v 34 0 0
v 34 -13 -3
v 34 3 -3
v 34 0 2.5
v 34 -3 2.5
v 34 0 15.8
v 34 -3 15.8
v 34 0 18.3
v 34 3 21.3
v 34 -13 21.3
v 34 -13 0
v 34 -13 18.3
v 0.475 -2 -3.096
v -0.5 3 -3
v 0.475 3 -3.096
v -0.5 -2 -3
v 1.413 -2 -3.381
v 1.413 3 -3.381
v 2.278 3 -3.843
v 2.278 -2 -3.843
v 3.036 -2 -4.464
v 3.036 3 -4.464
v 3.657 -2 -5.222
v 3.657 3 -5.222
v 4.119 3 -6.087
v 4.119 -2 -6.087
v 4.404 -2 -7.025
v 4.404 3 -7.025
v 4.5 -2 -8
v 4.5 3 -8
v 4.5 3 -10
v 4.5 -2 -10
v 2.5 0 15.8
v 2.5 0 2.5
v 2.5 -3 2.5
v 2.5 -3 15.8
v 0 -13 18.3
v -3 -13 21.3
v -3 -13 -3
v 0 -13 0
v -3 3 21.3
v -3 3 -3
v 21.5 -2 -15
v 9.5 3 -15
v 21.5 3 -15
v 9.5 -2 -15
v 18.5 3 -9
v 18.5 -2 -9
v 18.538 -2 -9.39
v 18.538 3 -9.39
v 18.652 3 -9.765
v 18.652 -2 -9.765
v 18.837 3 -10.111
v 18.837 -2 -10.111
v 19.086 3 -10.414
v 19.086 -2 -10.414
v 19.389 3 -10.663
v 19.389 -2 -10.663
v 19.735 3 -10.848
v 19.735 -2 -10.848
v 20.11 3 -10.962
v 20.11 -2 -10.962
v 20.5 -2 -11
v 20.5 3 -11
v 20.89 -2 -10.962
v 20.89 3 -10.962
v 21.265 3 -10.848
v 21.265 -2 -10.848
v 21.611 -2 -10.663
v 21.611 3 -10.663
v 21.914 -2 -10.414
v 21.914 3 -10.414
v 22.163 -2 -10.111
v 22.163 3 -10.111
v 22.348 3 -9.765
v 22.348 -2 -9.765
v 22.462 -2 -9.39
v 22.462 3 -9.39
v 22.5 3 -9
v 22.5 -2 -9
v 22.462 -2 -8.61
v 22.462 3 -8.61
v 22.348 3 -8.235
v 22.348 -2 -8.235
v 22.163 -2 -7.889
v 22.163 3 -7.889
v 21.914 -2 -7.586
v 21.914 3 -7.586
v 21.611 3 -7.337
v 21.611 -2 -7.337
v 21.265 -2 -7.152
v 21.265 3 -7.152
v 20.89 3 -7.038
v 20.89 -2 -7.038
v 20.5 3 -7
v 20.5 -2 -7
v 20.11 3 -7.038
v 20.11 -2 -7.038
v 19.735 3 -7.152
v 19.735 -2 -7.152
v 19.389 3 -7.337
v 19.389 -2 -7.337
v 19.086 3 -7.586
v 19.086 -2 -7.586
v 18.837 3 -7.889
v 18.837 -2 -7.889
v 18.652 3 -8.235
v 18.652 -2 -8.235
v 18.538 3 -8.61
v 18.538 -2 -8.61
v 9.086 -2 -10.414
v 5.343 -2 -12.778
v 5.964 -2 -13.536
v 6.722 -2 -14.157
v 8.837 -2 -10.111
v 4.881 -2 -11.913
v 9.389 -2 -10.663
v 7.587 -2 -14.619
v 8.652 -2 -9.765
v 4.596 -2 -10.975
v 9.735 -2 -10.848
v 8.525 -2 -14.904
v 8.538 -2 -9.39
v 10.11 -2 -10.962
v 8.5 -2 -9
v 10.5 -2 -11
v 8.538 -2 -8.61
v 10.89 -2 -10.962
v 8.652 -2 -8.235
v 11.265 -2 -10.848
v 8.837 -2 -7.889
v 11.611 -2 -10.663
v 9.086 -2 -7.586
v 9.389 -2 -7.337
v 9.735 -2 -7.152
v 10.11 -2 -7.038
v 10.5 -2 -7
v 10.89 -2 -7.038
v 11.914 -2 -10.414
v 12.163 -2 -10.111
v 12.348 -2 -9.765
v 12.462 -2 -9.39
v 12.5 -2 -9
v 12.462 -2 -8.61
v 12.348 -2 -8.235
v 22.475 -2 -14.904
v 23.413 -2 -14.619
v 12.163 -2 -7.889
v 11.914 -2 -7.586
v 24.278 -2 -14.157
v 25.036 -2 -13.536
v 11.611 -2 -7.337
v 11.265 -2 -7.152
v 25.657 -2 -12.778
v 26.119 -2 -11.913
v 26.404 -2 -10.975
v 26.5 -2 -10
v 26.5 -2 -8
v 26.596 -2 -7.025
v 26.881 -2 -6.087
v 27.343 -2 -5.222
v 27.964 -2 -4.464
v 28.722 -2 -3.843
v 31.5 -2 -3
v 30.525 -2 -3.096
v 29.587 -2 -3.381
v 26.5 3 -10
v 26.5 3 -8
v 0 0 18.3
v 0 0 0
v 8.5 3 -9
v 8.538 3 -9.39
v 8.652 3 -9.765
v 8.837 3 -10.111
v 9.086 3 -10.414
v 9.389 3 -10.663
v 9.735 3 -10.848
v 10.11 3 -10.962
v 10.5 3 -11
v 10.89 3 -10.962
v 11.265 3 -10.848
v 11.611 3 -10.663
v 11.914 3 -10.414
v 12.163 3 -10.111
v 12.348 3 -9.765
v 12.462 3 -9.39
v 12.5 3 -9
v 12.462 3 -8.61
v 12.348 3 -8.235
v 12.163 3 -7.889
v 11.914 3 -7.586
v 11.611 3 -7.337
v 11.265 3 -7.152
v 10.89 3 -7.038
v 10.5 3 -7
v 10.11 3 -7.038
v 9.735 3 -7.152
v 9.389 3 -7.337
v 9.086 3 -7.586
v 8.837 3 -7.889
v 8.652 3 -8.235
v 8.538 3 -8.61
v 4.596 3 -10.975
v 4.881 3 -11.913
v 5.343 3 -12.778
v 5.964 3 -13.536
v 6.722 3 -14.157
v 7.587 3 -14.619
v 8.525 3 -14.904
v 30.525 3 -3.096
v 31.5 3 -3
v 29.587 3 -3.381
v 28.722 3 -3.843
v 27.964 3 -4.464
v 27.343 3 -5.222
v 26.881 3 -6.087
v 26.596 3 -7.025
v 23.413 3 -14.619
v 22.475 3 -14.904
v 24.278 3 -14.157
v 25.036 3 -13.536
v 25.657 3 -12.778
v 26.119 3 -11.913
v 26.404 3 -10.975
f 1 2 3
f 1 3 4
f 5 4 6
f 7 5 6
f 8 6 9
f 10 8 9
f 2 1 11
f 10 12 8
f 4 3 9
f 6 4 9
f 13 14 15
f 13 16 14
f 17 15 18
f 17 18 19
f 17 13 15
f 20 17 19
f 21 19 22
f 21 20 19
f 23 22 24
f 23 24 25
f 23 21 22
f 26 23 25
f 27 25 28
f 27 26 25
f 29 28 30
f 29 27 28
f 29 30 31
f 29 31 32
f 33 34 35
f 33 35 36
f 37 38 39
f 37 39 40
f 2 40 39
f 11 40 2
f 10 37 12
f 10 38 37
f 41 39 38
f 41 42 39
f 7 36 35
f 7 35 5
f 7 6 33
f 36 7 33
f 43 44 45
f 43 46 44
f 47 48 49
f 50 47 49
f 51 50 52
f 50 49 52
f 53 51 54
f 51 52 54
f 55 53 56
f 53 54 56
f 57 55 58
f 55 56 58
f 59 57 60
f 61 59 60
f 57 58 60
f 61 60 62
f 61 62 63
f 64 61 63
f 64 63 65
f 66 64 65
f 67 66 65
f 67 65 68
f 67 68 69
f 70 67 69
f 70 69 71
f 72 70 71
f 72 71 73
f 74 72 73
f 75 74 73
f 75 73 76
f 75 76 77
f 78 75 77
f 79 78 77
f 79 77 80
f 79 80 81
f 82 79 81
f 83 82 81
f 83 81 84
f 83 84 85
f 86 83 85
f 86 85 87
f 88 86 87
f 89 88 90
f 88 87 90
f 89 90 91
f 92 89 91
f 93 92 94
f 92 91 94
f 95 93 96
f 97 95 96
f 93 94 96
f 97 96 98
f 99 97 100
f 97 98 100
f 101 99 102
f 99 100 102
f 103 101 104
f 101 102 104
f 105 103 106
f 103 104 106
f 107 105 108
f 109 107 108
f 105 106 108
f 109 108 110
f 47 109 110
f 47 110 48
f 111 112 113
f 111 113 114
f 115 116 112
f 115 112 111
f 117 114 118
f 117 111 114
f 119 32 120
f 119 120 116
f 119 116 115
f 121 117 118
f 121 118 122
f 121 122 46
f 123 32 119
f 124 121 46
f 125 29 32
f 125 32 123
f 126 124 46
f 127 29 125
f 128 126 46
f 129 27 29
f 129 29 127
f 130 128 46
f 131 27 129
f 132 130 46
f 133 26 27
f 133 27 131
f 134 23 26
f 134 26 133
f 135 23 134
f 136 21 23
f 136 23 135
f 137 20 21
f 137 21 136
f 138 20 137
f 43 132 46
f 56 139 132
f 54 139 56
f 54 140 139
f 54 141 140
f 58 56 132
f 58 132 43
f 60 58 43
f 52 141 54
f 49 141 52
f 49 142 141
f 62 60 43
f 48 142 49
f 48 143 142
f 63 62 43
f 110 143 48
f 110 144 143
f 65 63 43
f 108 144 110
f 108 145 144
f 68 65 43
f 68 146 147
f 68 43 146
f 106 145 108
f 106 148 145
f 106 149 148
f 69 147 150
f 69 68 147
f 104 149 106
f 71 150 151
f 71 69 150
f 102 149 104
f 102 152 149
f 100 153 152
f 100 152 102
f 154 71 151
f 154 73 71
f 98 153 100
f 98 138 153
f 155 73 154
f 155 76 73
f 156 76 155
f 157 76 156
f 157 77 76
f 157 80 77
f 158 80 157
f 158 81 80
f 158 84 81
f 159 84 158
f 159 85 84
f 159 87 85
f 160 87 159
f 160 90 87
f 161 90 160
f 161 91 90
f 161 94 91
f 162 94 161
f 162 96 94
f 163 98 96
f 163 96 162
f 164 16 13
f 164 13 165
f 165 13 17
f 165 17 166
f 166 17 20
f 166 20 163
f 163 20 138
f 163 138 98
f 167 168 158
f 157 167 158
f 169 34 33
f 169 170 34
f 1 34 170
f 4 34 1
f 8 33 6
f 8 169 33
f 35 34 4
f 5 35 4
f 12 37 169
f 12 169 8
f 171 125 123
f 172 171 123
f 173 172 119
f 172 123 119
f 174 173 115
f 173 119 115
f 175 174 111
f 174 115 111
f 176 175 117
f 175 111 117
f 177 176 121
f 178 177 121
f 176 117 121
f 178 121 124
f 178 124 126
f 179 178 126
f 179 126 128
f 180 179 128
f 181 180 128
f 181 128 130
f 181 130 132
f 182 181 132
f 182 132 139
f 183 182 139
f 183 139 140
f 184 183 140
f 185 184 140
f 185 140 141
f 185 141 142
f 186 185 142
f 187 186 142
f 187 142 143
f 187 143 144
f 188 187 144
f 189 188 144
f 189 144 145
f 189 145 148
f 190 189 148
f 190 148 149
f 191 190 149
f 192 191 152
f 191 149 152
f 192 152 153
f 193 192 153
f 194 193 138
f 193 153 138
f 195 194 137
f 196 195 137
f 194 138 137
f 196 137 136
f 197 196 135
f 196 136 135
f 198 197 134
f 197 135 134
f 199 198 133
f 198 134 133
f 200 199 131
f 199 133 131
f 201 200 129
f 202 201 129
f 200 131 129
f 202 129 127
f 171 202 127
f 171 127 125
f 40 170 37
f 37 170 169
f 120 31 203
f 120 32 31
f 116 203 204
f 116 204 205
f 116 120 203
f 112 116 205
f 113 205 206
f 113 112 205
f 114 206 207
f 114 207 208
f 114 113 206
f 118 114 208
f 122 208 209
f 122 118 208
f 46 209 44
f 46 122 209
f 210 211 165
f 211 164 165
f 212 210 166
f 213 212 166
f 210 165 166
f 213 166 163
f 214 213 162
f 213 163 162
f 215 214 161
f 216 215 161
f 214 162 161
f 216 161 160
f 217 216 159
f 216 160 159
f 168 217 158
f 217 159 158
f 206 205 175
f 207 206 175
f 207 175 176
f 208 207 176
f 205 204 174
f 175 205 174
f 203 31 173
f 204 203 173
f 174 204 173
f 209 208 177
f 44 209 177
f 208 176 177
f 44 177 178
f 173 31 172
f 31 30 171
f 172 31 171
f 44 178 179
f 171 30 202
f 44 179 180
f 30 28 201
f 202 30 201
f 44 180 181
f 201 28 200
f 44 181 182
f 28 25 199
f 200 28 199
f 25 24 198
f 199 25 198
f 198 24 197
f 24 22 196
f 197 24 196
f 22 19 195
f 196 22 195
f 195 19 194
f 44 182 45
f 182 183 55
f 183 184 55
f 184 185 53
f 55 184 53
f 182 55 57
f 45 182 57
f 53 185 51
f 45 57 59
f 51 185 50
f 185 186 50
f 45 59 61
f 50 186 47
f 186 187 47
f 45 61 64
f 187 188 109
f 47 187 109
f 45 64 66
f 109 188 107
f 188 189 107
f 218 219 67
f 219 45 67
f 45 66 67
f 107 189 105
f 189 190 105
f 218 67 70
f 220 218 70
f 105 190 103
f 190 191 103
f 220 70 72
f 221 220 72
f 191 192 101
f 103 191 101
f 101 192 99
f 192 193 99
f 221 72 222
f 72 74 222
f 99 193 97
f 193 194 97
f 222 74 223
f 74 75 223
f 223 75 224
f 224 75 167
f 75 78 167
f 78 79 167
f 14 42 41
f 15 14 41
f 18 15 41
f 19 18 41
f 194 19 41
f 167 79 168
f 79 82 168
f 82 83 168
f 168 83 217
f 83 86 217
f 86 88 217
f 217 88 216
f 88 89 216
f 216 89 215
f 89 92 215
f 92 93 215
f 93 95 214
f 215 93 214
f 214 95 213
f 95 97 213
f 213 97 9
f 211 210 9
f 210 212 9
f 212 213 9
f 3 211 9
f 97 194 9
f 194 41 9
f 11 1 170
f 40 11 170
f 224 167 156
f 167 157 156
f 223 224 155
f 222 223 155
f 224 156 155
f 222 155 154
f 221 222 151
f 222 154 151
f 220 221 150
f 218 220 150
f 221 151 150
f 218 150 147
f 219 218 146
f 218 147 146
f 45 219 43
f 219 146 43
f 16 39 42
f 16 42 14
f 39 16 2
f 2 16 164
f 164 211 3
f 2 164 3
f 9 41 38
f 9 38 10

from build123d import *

# Parameters (mm, degrees)
F0_W      = 37
F0_H      = 24.3
F0_W_2    = 31
F0_H_2    = 9.15
F1_DEPTH  = 3
F2_DEPTH  = 13
F3_W      = 3
F3_H      = 18.3
F4_DEPTH  = 13
F5_W      = 28.5
F5_H      = 13.3
F5_W_2    = 3
F6_DEPTH  = 3
F7_W      = 22
F7_H      = 5
F8_DEPTH  = 12
F10_R     = 5
F11_DEPTH = 25


with BuildPart() as f1:
    # F0 (on Front) → F1 (new body)
    with BuildSketch(Plane.XZ):
        with Locations((15.5, 9.15)):
            Rectangle(F0_W, F0_H)
        Polygon((31, 0), (0, 0), (0, 9.15), (0, 18.3), (31, 18.3), (31, 9.15), align=None, mode=Mode.SUBTRACT)
        with Locations((15.5, 13.725)):
            Rectangle(F0_W_2, F0_H_2)
        with Locations((15.5, 4.575)):
            Rectangle(F0_W_2, F0_H_2)
    extrude(amount=-F1_DEPTH)

    # F0 (on Front) → F2 (join)
    with BuildSketch(Plane.XZ):
        with Locations((15.5, 9.15)):
            Rectangle(F0_W, F0_H)
        Polygon((31, 0), (0, 0), (0, 9.15), (0, 18.3), (31, 18.3), (31, 9.15), align=None, mode=Mode.SUBTRACT)
    extrude(amount=F2_DEPTH)

    # F3 (on face) → F4 (cut, through all)
    with BuildSketch(Plane.XZ.offset(13)):
        with Locations((32.5, 9.15)):
            Rectangle(F3_W, F3_H)
    extrude(amount=-F4_DEPTH, mode=Mode.SUBTRACT)

    # F5 (on face) → F6 (join)
    with BuildSketch(Plane.XZ):
        with Locations((16.75, 9.15)):
            Rectangle(F5_W, F5_H)
        with Locations((32.5, 9.15)):
            Rectangle(F5_W_2, F5_H)
    extrude(amount=F6_DEPTH)

    # F7 (on face) → F8 (join)
    with BuildSketch(Plane(origin=(0, 0, -3), x_dir=(1, 0, 0), z_dir=(0, 0, -1))):
        with Locations((15.5, -0.5)):
            Rectangle(F7_W, F7_H)
    extrude(amount=F8_DEPTH)

    # F10
    f10_edges = [f1.edges().sort_by_distance(p)[0] for p in [
        (4.5, 0.5, -15),
        (4.5, 0.5, -3),
        (26.5, 0.5, -15),
        (26.5, 0.5, -3),
    ]]
    fillet(f10_edges, radius=F10_R)

    # F9 (on face) → F11 (cut)
    with BuildSketch(Plane.XZ.offset(2)):
        with BuildLine():
            Line((8.5, -9), (12.5, -9))
            ThreePointArc((12.5, -9), (10.5, -7), (8.5, -9))
        make_face()
        with BuildLine():
            ThreePointArc((8.5, -9), (10.5, -11), (12.5, -9))
            Line((12.5, -9), (8.5, -9))
        make_face()
        with BuildLine():
            Line((18.5, -9), (22.5, -9))
            ThreePointArc((22.5, -9), (20.5, -7), (18.5, -9))
        make_face()
        with BuildLine():
            ThreePointArc((18.5, -9), (20.5, -11), (22.5, -9))
            Line((22.5, -9), (18.5, -9))
        make_face()
    extrude(amount=-F11_DEPTH, mode=Mode.SUBTRACT)


solid = f1.part
